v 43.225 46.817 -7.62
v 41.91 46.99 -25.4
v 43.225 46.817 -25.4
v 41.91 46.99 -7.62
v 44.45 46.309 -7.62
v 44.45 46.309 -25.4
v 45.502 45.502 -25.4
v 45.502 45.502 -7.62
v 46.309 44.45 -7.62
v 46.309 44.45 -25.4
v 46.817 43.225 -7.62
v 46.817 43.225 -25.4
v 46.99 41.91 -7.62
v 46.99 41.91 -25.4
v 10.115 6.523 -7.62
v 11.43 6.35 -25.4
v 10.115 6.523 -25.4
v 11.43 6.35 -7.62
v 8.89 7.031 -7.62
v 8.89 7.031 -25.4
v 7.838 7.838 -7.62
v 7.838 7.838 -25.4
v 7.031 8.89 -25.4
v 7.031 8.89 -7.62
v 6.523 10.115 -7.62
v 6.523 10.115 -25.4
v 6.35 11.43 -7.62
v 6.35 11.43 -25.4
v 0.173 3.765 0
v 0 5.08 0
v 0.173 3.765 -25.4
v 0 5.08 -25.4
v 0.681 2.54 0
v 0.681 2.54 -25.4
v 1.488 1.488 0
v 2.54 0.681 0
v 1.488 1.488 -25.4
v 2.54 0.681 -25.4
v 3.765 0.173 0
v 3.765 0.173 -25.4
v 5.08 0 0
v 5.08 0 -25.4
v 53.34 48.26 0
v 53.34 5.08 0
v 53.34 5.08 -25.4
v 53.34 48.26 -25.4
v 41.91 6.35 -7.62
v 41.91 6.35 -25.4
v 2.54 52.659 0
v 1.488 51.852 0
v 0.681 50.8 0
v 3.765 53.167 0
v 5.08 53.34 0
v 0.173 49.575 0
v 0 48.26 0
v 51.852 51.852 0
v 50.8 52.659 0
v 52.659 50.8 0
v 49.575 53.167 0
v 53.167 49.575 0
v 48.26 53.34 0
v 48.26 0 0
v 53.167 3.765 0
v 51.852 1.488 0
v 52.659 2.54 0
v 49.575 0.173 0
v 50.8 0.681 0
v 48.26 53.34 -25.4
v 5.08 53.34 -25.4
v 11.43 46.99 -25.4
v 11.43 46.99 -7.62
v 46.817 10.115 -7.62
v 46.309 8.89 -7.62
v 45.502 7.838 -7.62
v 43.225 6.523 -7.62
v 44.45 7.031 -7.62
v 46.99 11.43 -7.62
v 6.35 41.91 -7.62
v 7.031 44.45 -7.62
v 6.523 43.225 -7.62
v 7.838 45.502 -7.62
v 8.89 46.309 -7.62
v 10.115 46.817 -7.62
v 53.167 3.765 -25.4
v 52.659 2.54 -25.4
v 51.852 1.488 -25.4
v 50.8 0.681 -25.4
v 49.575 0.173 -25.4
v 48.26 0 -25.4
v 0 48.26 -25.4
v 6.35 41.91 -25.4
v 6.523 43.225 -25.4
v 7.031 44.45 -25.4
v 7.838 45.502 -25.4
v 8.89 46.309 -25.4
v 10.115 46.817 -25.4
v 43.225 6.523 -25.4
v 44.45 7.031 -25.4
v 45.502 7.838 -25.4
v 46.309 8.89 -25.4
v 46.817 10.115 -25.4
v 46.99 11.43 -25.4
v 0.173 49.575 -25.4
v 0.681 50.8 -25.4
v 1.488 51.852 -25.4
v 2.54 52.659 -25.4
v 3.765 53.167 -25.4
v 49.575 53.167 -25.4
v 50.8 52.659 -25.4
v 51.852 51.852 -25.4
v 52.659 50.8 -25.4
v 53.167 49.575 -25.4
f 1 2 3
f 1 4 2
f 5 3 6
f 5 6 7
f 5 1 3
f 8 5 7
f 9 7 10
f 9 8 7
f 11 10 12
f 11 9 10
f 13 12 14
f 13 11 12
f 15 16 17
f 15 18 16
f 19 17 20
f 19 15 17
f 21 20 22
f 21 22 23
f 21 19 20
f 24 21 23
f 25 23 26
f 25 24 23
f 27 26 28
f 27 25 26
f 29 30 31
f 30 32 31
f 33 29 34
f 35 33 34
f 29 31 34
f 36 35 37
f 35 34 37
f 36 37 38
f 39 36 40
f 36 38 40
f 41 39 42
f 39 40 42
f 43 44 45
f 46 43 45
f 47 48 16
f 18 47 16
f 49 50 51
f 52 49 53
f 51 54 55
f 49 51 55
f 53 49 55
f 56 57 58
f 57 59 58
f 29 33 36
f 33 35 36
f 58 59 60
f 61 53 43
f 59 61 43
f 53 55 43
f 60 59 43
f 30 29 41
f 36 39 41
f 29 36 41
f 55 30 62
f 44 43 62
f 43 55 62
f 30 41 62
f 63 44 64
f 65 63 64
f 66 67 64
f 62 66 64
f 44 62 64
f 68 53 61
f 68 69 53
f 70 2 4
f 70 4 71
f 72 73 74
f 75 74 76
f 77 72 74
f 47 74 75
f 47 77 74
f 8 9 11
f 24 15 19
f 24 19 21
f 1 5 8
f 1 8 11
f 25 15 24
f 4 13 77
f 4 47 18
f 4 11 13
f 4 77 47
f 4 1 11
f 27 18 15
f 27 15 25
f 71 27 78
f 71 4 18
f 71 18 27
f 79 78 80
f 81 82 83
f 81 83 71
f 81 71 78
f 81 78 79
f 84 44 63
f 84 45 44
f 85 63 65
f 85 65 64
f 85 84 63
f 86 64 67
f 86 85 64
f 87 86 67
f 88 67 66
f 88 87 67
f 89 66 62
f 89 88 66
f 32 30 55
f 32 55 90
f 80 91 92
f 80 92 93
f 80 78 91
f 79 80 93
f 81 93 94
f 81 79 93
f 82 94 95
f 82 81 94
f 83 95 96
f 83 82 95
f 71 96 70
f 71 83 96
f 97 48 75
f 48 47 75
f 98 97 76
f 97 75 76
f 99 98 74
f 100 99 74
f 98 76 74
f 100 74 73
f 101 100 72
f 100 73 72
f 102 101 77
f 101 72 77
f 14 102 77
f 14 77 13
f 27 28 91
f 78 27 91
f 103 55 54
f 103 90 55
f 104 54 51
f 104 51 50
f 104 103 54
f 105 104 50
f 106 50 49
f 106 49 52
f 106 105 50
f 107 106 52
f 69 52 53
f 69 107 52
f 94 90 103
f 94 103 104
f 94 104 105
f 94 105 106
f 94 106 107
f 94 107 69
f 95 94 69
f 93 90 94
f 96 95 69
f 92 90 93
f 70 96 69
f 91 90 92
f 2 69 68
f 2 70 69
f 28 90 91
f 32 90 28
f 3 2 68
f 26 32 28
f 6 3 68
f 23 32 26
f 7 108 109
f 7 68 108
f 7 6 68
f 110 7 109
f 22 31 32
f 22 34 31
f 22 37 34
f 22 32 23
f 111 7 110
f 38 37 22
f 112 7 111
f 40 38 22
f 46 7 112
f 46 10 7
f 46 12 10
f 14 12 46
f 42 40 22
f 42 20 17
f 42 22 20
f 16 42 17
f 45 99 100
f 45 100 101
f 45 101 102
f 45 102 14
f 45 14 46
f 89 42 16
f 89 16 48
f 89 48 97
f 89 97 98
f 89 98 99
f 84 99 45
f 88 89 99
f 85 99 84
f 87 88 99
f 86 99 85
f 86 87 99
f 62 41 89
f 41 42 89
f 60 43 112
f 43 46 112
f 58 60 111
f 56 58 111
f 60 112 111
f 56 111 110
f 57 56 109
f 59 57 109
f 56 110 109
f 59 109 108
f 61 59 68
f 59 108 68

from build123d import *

# Parameters (mm, degrees)
SKETCH1_W           = 53.34
SKETCH1_H           = 25.4
BOSS_EXTRUDE1_DEPTH = 53.34
FILLET1_R           = 5.08
SKETCH2_W           = 40.64
SKETCH2_H           = 40.64
CUT_EXTRUDE1_DEPTH  = 17.78
FILLET2_R           = 5.08


with BuildPart() as part:
    # Sketch1 → Boss-Extrude1 (new body)
    with BuildSketch(Plane(origin=(0, 0, 0), x_dir=(1, 0, 0), z_dir=(0, 1, 0))):
        with Locations((26.67, 12.7)):
            Rectangle(SKETCH1_W, SKETCH1_H)
    extrude(amount=BOSS_EXTRUDE1_DEPTH)

    # Fillet1
    fillet1_edges = [part.edges().sort_by_distance(p)[0] for p in [
        (53.34, 53.34, -12.7),
        (0, 53.34, -12.7),
        (53.34, 0, -12.7),
        (0, 0, -12.7),
    ]]
    fillet(fillet1_edges, radius=FILLET1_R)

    # Sketch2 → Cut-Extrude1 (cut)
    with BuildSketch(Plane(origin=(0, 0, -25.4), x_dir=(-1, 0, 0), z_dir=(0, 0, -1))):
        with Locations((-26.67, 26.67)):
            Rectangle(SKETCH2_W, SKETCH2_H)
    extrude(amount=-CUT_EXTRUDE1_DEPTH, mode=Mode.SUBTRACT)

    # Fillet2
    fillet2_edges = [part.edges().sort_by_distance(p)[0] for p in [
        (46.99, 6.35, -16.51),
        (46.99, 46.99, -16.51),
        (6.35, 46.99, -16.51),
        (6.35, 6.35, -16.51),
    ]]
    fillet(fillet2_edges, radius=FILLET2_R)


solid = part.part
